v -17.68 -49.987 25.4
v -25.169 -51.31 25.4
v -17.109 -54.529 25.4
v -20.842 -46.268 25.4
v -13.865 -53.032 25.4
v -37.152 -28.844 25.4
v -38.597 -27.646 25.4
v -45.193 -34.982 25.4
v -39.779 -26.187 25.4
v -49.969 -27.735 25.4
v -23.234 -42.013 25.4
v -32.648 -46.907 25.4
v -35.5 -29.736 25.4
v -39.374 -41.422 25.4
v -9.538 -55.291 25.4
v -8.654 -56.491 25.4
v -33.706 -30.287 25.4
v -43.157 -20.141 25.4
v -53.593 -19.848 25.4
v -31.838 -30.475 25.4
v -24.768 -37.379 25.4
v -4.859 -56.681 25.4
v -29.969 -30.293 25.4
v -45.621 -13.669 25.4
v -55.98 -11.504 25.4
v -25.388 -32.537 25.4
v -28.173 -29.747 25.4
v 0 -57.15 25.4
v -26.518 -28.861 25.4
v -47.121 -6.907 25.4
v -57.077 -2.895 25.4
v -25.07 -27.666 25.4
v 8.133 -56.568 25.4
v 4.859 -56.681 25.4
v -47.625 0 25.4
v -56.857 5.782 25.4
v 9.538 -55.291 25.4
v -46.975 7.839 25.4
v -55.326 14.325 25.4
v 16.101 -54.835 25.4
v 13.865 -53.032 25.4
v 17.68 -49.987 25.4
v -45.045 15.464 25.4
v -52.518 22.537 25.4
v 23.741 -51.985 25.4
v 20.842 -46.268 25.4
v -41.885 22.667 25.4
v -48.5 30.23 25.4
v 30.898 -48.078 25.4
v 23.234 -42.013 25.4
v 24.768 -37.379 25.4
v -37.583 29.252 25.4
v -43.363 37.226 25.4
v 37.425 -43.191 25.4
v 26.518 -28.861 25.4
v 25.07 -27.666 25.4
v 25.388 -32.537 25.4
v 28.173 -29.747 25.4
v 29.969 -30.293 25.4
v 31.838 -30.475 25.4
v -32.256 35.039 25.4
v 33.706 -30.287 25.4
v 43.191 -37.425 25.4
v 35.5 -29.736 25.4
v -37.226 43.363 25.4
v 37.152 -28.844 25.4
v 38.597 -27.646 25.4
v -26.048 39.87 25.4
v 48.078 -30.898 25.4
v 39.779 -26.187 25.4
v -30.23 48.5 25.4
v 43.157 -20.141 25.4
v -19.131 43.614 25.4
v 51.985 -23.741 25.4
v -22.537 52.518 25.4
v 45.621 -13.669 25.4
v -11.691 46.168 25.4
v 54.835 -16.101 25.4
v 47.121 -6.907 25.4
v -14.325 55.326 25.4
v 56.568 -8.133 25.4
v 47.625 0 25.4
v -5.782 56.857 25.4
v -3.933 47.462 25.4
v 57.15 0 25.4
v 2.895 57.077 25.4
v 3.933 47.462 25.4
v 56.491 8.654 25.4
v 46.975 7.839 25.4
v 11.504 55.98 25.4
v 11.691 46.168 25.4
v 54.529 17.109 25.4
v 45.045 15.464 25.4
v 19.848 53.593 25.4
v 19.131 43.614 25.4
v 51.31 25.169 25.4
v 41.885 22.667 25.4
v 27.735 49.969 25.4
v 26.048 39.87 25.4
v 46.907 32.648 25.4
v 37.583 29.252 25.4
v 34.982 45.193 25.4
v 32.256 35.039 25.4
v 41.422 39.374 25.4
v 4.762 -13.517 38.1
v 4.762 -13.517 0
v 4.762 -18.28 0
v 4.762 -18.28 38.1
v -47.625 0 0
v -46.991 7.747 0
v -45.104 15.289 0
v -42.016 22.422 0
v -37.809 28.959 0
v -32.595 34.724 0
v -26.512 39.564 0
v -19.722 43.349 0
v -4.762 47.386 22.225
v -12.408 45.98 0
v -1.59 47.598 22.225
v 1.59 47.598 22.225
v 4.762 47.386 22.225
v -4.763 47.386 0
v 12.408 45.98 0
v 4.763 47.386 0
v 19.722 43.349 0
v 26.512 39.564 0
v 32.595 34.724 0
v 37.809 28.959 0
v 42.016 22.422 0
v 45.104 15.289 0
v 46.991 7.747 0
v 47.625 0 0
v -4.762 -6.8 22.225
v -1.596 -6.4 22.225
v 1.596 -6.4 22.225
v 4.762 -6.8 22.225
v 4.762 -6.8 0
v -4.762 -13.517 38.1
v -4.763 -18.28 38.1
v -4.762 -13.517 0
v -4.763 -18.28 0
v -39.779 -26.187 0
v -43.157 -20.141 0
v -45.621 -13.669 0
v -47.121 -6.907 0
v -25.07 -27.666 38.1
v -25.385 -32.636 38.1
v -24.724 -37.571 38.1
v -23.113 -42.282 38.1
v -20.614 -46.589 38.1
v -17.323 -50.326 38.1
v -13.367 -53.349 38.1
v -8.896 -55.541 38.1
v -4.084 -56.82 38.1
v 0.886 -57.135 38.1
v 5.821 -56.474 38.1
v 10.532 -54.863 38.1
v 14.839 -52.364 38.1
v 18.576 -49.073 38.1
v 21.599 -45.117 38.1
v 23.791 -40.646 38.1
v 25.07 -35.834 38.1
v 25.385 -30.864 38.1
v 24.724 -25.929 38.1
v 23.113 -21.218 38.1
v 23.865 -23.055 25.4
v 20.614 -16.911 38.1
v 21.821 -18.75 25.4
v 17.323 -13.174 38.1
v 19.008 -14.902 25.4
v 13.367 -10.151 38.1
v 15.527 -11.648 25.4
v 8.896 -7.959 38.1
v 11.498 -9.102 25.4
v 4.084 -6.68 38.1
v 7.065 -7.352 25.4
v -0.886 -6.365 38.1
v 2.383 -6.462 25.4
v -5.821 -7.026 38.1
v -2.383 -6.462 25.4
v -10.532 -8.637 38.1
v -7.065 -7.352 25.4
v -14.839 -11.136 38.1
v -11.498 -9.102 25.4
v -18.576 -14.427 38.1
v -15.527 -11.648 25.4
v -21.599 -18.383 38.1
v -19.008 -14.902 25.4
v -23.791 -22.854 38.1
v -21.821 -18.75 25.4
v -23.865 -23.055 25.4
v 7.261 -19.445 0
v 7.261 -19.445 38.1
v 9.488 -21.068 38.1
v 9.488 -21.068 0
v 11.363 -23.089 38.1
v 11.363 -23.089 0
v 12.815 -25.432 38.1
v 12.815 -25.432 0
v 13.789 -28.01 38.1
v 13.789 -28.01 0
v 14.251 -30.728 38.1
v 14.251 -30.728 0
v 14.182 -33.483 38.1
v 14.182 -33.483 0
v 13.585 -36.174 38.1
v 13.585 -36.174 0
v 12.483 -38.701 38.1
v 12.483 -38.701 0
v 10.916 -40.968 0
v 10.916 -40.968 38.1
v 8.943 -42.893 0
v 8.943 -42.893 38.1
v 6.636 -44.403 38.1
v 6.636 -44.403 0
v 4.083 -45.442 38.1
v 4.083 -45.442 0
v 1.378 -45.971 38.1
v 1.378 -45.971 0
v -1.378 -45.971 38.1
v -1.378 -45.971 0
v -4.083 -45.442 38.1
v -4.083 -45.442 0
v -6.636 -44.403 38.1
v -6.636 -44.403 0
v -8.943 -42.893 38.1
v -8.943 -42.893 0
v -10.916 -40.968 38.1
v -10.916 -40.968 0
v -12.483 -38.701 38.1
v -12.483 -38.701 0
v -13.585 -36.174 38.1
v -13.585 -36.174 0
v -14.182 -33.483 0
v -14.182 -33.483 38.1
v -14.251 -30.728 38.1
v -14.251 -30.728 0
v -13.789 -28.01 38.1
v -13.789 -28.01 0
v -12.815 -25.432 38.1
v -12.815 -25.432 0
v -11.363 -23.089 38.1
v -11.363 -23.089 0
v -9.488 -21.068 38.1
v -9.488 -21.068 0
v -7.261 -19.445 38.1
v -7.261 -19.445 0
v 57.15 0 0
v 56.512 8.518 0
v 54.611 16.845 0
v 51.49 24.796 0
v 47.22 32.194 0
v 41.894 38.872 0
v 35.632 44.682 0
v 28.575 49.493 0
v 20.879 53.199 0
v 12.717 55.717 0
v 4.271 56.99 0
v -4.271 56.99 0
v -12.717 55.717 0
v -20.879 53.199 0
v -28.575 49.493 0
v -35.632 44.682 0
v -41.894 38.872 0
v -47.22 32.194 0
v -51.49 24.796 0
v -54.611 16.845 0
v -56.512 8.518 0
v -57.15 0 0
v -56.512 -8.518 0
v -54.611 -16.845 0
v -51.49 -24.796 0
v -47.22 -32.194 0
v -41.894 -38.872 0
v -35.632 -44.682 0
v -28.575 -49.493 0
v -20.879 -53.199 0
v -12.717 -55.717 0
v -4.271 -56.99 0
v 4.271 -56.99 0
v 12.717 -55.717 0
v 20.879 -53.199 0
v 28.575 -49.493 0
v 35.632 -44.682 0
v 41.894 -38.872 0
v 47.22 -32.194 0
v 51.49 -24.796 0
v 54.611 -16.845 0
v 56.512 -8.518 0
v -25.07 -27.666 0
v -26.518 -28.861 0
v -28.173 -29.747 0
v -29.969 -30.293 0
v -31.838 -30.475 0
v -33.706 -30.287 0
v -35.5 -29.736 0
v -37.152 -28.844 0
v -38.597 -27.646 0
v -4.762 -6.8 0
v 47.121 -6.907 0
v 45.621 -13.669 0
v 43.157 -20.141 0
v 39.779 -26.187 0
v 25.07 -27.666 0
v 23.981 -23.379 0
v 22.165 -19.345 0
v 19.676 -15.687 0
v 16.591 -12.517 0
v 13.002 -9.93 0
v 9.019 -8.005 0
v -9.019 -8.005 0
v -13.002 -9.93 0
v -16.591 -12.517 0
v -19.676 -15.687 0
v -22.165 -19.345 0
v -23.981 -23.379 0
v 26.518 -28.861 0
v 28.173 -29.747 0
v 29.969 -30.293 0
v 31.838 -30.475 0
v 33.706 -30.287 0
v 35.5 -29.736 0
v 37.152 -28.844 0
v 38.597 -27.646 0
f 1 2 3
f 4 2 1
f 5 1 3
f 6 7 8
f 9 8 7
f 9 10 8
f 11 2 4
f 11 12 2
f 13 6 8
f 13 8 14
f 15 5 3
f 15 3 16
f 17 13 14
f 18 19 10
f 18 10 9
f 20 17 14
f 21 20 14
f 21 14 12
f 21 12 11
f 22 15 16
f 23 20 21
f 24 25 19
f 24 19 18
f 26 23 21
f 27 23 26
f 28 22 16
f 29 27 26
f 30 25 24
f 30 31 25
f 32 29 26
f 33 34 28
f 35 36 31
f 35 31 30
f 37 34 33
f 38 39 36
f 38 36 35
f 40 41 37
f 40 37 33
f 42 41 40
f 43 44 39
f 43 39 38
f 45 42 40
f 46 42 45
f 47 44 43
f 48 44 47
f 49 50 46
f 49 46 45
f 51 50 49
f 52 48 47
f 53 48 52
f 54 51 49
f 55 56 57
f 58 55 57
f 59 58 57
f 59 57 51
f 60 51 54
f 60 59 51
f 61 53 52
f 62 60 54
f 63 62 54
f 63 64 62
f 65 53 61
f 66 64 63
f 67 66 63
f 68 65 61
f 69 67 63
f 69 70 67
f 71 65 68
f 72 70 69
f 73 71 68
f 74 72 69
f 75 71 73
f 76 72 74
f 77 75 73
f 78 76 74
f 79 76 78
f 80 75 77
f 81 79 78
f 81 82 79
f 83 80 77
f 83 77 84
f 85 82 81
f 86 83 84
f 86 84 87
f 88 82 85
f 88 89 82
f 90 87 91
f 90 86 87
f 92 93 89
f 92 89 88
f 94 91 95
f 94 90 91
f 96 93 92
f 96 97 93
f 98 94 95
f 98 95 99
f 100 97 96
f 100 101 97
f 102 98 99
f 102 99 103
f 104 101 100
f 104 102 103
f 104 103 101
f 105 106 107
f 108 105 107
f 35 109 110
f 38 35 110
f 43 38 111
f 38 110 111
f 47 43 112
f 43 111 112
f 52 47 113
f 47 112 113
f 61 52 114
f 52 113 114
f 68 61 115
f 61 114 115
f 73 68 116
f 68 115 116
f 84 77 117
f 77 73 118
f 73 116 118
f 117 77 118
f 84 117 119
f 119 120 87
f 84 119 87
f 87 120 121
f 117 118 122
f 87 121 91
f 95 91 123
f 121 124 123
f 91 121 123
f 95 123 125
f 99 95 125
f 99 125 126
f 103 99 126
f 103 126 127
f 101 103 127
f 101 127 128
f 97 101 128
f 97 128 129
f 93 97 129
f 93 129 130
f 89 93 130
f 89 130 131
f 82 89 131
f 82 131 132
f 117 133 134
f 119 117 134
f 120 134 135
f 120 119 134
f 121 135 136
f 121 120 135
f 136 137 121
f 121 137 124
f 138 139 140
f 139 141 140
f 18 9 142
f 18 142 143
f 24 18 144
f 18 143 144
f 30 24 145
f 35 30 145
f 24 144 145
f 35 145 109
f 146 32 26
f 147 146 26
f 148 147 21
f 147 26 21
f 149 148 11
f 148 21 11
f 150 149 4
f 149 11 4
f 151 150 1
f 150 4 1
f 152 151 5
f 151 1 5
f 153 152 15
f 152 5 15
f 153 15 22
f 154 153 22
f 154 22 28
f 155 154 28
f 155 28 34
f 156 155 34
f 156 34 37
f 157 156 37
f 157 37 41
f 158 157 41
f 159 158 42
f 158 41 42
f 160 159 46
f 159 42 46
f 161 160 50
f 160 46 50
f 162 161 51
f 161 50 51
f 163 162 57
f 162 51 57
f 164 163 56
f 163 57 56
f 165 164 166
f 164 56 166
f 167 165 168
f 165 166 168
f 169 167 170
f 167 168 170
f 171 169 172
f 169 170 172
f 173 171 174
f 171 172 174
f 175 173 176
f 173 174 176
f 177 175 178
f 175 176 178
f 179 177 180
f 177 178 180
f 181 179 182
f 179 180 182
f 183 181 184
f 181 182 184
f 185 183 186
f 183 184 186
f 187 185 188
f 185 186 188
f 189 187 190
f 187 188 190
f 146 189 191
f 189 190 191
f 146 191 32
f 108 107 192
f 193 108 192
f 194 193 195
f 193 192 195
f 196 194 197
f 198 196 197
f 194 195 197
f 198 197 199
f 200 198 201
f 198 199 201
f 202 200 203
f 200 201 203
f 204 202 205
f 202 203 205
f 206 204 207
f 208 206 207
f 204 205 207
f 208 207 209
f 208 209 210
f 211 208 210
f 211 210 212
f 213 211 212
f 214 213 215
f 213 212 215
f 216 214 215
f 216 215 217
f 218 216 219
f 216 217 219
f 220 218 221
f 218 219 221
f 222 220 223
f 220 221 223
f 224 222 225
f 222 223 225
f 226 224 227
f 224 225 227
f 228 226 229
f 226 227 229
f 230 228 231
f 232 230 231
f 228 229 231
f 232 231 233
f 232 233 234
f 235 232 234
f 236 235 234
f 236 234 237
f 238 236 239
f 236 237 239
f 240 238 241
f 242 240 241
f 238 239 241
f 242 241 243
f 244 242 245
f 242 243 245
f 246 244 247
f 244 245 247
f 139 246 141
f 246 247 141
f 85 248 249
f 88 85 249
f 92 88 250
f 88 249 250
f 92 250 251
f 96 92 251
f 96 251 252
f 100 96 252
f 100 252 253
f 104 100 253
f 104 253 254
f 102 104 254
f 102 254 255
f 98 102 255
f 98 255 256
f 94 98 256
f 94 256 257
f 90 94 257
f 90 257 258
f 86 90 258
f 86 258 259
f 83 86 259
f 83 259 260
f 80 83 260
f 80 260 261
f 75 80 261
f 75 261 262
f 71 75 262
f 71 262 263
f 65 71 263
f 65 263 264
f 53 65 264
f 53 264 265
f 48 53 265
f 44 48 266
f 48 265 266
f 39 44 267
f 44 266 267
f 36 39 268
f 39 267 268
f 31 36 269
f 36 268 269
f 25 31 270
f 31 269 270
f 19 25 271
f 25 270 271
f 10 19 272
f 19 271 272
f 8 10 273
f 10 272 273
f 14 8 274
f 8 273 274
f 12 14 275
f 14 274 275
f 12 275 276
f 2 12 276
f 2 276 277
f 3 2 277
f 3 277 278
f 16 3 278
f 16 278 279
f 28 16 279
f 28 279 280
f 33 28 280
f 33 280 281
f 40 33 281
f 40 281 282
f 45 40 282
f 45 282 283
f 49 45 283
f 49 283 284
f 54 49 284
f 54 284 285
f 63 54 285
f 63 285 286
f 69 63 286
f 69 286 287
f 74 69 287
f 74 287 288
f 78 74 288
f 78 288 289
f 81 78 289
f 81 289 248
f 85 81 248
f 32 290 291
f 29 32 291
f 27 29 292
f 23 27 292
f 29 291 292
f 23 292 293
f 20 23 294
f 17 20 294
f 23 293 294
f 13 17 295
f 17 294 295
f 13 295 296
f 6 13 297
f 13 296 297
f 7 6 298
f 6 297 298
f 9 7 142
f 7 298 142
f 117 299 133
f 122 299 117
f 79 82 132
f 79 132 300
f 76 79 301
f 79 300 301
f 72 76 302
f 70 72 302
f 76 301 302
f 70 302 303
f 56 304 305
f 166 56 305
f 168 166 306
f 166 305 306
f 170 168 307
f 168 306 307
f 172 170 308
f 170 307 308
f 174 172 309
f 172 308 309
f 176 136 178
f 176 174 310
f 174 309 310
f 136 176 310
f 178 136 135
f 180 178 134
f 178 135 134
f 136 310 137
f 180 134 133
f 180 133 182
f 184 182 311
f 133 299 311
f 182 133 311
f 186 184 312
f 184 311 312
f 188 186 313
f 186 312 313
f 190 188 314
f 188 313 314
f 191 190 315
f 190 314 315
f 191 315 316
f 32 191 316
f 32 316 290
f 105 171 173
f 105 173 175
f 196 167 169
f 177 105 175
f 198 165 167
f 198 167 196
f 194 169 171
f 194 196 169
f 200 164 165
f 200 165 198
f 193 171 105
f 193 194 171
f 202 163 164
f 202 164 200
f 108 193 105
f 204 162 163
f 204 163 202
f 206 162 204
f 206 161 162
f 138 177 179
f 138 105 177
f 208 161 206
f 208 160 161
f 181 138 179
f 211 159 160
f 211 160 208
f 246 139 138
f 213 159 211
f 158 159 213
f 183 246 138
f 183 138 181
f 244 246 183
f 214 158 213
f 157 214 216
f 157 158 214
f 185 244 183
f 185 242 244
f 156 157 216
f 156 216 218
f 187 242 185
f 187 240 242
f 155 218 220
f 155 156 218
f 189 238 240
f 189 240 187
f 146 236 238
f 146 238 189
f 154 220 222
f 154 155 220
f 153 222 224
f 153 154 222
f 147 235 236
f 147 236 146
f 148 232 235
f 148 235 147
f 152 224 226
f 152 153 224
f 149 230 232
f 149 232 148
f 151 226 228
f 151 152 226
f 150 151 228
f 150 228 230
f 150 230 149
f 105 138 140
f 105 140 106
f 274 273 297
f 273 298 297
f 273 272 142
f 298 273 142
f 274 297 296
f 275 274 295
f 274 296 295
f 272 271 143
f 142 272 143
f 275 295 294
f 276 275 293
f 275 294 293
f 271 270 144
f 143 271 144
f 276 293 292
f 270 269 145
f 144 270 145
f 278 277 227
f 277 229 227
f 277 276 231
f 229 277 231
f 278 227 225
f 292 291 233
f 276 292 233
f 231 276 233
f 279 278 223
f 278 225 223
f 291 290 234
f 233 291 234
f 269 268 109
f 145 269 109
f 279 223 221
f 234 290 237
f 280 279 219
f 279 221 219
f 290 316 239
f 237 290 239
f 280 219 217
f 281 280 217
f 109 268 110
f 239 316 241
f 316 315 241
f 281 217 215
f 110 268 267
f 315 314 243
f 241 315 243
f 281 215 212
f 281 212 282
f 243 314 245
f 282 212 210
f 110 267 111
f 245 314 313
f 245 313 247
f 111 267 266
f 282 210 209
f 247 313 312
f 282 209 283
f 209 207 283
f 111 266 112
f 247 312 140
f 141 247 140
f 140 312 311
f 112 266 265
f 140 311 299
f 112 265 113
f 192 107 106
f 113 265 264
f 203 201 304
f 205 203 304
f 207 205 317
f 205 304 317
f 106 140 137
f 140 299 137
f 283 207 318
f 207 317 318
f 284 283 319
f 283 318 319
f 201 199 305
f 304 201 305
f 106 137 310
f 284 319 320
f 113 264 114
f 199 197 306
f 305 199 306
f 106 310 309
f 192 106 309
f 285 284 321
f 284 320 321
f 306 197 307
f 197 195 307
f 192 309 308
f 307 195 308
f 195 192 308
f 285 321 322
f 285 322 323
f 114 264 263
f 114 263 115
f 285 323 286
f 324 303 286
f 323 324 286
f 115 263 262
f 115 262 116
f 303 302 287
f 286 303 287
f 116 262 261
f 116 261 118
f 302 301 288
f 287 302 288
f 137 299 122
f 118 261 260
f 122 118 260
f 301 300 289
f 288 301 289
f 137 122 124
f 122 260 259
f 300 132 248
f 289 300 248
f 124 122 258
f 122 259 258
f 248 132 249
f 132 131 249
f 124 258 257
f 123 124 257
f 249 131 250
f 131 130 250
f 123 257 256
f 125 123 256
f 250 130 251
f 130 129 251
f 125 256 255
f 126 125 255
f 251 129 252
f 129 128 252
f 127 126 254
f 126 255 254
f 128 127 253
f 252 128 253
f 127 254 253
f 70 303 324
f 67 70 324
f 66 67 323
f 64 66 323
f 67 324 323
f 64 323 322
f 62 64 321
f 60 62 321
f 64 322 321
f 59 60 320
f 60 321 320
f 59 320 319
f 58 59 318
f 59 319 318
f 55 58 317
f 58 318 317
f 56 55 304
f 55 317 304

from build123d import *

# Parameters (mm, degrees)
SKETCH1_R           = 57.15
BOSS_EXTRUDE5_DEPTH = 25.4
SKETCH4_R           = 25.4
BOSS_EXTRUDE7_DEPTH = 12.7
SKETCH5_W           = 9.525
SKETCH5_H           = 56.448043325
BOSS_EXTRUDE8_DEPTH = 22.225


with BuildPart() as part:
    # Sketch1 → Boss-Extrude5 (new body)
    with BuildSketch(Plane.XY):
        Circle(SKETCH1_R)
        with BuildLine():
            Line((-4.7625, -18.279615818), (-4.7625, -13.517115818))
            Line((-4.7625, -13.517115818), (4.7625, -13.517115818))
            Line((4.7625, -13.517115818), (4.7625, -18.279615818))
            ThreePointArc((4.7625, -18.279615818), (0, -46.0375), (-4.7625, -18.279615818))
        make_face(mode=Mode.SUBTRACT)
        with BuildLine():
            ThreePointArc((-25.069578471, -27.666345352), (-32.776314377, -30.426898024), (-39.77908045, -26.187122475))
            ThreePointArc((-39.77908045, -26.187122475), (-45.621372905, -13.668612193), (-47.625, 0))
            ThreePointArc((-47.625, 0), (0, 47.625), (47.625, 0))
            ThreePointArc((47.625, 0), (45.621372905, -13.668612193), (39.77908045, -26.187122475))
            ThreePointArc((39.77908045, -26.187122475), (32.776314377, -30.426898024), (25.069578471, -27.666345352))
            ThreePointArc((25.069578471, -27.666345352), (0, -6.35), (-25.069578471, -27.666345352))
        make_face(mode=Mode.SUBTRACT)
    extrude(amount=BOSS_EXTRUDE5_DEPTH)

    # Sketch4 → Boss-Extrude7 (add)
    with BuildSketch(Plane.XY.offset(25.4)):
        with Locations(Location((0, -31.75, 0), (0, 0, 170.748186525))):
            Circle(SKETCH4_R)
        with BuildLine():
            Line((-4.7625, -18.279615818), (-4.7625, -13.517115818))
            Line((-4.7625, -13.517115818), (4.7625, -13.517115818))
            Line((4.7625, -13.517115818), (4.7625, -18.279615818))
            ThreePointArc((4.7625, -18.279615818), (0, -46.0375), (-4.7625, -18.279615818))
        make_face(mode=Mode.SUBTRACT)
    extrude(amount=BOSS_EXTRUDE7_DEPTH)

    # Sketch5 → Boss-Extrude8 (add)
    with BuildSketch(Plane.XY):
        with Locations((0, 20.552658513)):
            Rectangle(SKETCH5_W, SKETCH5_H)
    extrude(amount=BOSS_EXTRUDE8_DEPTH)


solid = part.part
